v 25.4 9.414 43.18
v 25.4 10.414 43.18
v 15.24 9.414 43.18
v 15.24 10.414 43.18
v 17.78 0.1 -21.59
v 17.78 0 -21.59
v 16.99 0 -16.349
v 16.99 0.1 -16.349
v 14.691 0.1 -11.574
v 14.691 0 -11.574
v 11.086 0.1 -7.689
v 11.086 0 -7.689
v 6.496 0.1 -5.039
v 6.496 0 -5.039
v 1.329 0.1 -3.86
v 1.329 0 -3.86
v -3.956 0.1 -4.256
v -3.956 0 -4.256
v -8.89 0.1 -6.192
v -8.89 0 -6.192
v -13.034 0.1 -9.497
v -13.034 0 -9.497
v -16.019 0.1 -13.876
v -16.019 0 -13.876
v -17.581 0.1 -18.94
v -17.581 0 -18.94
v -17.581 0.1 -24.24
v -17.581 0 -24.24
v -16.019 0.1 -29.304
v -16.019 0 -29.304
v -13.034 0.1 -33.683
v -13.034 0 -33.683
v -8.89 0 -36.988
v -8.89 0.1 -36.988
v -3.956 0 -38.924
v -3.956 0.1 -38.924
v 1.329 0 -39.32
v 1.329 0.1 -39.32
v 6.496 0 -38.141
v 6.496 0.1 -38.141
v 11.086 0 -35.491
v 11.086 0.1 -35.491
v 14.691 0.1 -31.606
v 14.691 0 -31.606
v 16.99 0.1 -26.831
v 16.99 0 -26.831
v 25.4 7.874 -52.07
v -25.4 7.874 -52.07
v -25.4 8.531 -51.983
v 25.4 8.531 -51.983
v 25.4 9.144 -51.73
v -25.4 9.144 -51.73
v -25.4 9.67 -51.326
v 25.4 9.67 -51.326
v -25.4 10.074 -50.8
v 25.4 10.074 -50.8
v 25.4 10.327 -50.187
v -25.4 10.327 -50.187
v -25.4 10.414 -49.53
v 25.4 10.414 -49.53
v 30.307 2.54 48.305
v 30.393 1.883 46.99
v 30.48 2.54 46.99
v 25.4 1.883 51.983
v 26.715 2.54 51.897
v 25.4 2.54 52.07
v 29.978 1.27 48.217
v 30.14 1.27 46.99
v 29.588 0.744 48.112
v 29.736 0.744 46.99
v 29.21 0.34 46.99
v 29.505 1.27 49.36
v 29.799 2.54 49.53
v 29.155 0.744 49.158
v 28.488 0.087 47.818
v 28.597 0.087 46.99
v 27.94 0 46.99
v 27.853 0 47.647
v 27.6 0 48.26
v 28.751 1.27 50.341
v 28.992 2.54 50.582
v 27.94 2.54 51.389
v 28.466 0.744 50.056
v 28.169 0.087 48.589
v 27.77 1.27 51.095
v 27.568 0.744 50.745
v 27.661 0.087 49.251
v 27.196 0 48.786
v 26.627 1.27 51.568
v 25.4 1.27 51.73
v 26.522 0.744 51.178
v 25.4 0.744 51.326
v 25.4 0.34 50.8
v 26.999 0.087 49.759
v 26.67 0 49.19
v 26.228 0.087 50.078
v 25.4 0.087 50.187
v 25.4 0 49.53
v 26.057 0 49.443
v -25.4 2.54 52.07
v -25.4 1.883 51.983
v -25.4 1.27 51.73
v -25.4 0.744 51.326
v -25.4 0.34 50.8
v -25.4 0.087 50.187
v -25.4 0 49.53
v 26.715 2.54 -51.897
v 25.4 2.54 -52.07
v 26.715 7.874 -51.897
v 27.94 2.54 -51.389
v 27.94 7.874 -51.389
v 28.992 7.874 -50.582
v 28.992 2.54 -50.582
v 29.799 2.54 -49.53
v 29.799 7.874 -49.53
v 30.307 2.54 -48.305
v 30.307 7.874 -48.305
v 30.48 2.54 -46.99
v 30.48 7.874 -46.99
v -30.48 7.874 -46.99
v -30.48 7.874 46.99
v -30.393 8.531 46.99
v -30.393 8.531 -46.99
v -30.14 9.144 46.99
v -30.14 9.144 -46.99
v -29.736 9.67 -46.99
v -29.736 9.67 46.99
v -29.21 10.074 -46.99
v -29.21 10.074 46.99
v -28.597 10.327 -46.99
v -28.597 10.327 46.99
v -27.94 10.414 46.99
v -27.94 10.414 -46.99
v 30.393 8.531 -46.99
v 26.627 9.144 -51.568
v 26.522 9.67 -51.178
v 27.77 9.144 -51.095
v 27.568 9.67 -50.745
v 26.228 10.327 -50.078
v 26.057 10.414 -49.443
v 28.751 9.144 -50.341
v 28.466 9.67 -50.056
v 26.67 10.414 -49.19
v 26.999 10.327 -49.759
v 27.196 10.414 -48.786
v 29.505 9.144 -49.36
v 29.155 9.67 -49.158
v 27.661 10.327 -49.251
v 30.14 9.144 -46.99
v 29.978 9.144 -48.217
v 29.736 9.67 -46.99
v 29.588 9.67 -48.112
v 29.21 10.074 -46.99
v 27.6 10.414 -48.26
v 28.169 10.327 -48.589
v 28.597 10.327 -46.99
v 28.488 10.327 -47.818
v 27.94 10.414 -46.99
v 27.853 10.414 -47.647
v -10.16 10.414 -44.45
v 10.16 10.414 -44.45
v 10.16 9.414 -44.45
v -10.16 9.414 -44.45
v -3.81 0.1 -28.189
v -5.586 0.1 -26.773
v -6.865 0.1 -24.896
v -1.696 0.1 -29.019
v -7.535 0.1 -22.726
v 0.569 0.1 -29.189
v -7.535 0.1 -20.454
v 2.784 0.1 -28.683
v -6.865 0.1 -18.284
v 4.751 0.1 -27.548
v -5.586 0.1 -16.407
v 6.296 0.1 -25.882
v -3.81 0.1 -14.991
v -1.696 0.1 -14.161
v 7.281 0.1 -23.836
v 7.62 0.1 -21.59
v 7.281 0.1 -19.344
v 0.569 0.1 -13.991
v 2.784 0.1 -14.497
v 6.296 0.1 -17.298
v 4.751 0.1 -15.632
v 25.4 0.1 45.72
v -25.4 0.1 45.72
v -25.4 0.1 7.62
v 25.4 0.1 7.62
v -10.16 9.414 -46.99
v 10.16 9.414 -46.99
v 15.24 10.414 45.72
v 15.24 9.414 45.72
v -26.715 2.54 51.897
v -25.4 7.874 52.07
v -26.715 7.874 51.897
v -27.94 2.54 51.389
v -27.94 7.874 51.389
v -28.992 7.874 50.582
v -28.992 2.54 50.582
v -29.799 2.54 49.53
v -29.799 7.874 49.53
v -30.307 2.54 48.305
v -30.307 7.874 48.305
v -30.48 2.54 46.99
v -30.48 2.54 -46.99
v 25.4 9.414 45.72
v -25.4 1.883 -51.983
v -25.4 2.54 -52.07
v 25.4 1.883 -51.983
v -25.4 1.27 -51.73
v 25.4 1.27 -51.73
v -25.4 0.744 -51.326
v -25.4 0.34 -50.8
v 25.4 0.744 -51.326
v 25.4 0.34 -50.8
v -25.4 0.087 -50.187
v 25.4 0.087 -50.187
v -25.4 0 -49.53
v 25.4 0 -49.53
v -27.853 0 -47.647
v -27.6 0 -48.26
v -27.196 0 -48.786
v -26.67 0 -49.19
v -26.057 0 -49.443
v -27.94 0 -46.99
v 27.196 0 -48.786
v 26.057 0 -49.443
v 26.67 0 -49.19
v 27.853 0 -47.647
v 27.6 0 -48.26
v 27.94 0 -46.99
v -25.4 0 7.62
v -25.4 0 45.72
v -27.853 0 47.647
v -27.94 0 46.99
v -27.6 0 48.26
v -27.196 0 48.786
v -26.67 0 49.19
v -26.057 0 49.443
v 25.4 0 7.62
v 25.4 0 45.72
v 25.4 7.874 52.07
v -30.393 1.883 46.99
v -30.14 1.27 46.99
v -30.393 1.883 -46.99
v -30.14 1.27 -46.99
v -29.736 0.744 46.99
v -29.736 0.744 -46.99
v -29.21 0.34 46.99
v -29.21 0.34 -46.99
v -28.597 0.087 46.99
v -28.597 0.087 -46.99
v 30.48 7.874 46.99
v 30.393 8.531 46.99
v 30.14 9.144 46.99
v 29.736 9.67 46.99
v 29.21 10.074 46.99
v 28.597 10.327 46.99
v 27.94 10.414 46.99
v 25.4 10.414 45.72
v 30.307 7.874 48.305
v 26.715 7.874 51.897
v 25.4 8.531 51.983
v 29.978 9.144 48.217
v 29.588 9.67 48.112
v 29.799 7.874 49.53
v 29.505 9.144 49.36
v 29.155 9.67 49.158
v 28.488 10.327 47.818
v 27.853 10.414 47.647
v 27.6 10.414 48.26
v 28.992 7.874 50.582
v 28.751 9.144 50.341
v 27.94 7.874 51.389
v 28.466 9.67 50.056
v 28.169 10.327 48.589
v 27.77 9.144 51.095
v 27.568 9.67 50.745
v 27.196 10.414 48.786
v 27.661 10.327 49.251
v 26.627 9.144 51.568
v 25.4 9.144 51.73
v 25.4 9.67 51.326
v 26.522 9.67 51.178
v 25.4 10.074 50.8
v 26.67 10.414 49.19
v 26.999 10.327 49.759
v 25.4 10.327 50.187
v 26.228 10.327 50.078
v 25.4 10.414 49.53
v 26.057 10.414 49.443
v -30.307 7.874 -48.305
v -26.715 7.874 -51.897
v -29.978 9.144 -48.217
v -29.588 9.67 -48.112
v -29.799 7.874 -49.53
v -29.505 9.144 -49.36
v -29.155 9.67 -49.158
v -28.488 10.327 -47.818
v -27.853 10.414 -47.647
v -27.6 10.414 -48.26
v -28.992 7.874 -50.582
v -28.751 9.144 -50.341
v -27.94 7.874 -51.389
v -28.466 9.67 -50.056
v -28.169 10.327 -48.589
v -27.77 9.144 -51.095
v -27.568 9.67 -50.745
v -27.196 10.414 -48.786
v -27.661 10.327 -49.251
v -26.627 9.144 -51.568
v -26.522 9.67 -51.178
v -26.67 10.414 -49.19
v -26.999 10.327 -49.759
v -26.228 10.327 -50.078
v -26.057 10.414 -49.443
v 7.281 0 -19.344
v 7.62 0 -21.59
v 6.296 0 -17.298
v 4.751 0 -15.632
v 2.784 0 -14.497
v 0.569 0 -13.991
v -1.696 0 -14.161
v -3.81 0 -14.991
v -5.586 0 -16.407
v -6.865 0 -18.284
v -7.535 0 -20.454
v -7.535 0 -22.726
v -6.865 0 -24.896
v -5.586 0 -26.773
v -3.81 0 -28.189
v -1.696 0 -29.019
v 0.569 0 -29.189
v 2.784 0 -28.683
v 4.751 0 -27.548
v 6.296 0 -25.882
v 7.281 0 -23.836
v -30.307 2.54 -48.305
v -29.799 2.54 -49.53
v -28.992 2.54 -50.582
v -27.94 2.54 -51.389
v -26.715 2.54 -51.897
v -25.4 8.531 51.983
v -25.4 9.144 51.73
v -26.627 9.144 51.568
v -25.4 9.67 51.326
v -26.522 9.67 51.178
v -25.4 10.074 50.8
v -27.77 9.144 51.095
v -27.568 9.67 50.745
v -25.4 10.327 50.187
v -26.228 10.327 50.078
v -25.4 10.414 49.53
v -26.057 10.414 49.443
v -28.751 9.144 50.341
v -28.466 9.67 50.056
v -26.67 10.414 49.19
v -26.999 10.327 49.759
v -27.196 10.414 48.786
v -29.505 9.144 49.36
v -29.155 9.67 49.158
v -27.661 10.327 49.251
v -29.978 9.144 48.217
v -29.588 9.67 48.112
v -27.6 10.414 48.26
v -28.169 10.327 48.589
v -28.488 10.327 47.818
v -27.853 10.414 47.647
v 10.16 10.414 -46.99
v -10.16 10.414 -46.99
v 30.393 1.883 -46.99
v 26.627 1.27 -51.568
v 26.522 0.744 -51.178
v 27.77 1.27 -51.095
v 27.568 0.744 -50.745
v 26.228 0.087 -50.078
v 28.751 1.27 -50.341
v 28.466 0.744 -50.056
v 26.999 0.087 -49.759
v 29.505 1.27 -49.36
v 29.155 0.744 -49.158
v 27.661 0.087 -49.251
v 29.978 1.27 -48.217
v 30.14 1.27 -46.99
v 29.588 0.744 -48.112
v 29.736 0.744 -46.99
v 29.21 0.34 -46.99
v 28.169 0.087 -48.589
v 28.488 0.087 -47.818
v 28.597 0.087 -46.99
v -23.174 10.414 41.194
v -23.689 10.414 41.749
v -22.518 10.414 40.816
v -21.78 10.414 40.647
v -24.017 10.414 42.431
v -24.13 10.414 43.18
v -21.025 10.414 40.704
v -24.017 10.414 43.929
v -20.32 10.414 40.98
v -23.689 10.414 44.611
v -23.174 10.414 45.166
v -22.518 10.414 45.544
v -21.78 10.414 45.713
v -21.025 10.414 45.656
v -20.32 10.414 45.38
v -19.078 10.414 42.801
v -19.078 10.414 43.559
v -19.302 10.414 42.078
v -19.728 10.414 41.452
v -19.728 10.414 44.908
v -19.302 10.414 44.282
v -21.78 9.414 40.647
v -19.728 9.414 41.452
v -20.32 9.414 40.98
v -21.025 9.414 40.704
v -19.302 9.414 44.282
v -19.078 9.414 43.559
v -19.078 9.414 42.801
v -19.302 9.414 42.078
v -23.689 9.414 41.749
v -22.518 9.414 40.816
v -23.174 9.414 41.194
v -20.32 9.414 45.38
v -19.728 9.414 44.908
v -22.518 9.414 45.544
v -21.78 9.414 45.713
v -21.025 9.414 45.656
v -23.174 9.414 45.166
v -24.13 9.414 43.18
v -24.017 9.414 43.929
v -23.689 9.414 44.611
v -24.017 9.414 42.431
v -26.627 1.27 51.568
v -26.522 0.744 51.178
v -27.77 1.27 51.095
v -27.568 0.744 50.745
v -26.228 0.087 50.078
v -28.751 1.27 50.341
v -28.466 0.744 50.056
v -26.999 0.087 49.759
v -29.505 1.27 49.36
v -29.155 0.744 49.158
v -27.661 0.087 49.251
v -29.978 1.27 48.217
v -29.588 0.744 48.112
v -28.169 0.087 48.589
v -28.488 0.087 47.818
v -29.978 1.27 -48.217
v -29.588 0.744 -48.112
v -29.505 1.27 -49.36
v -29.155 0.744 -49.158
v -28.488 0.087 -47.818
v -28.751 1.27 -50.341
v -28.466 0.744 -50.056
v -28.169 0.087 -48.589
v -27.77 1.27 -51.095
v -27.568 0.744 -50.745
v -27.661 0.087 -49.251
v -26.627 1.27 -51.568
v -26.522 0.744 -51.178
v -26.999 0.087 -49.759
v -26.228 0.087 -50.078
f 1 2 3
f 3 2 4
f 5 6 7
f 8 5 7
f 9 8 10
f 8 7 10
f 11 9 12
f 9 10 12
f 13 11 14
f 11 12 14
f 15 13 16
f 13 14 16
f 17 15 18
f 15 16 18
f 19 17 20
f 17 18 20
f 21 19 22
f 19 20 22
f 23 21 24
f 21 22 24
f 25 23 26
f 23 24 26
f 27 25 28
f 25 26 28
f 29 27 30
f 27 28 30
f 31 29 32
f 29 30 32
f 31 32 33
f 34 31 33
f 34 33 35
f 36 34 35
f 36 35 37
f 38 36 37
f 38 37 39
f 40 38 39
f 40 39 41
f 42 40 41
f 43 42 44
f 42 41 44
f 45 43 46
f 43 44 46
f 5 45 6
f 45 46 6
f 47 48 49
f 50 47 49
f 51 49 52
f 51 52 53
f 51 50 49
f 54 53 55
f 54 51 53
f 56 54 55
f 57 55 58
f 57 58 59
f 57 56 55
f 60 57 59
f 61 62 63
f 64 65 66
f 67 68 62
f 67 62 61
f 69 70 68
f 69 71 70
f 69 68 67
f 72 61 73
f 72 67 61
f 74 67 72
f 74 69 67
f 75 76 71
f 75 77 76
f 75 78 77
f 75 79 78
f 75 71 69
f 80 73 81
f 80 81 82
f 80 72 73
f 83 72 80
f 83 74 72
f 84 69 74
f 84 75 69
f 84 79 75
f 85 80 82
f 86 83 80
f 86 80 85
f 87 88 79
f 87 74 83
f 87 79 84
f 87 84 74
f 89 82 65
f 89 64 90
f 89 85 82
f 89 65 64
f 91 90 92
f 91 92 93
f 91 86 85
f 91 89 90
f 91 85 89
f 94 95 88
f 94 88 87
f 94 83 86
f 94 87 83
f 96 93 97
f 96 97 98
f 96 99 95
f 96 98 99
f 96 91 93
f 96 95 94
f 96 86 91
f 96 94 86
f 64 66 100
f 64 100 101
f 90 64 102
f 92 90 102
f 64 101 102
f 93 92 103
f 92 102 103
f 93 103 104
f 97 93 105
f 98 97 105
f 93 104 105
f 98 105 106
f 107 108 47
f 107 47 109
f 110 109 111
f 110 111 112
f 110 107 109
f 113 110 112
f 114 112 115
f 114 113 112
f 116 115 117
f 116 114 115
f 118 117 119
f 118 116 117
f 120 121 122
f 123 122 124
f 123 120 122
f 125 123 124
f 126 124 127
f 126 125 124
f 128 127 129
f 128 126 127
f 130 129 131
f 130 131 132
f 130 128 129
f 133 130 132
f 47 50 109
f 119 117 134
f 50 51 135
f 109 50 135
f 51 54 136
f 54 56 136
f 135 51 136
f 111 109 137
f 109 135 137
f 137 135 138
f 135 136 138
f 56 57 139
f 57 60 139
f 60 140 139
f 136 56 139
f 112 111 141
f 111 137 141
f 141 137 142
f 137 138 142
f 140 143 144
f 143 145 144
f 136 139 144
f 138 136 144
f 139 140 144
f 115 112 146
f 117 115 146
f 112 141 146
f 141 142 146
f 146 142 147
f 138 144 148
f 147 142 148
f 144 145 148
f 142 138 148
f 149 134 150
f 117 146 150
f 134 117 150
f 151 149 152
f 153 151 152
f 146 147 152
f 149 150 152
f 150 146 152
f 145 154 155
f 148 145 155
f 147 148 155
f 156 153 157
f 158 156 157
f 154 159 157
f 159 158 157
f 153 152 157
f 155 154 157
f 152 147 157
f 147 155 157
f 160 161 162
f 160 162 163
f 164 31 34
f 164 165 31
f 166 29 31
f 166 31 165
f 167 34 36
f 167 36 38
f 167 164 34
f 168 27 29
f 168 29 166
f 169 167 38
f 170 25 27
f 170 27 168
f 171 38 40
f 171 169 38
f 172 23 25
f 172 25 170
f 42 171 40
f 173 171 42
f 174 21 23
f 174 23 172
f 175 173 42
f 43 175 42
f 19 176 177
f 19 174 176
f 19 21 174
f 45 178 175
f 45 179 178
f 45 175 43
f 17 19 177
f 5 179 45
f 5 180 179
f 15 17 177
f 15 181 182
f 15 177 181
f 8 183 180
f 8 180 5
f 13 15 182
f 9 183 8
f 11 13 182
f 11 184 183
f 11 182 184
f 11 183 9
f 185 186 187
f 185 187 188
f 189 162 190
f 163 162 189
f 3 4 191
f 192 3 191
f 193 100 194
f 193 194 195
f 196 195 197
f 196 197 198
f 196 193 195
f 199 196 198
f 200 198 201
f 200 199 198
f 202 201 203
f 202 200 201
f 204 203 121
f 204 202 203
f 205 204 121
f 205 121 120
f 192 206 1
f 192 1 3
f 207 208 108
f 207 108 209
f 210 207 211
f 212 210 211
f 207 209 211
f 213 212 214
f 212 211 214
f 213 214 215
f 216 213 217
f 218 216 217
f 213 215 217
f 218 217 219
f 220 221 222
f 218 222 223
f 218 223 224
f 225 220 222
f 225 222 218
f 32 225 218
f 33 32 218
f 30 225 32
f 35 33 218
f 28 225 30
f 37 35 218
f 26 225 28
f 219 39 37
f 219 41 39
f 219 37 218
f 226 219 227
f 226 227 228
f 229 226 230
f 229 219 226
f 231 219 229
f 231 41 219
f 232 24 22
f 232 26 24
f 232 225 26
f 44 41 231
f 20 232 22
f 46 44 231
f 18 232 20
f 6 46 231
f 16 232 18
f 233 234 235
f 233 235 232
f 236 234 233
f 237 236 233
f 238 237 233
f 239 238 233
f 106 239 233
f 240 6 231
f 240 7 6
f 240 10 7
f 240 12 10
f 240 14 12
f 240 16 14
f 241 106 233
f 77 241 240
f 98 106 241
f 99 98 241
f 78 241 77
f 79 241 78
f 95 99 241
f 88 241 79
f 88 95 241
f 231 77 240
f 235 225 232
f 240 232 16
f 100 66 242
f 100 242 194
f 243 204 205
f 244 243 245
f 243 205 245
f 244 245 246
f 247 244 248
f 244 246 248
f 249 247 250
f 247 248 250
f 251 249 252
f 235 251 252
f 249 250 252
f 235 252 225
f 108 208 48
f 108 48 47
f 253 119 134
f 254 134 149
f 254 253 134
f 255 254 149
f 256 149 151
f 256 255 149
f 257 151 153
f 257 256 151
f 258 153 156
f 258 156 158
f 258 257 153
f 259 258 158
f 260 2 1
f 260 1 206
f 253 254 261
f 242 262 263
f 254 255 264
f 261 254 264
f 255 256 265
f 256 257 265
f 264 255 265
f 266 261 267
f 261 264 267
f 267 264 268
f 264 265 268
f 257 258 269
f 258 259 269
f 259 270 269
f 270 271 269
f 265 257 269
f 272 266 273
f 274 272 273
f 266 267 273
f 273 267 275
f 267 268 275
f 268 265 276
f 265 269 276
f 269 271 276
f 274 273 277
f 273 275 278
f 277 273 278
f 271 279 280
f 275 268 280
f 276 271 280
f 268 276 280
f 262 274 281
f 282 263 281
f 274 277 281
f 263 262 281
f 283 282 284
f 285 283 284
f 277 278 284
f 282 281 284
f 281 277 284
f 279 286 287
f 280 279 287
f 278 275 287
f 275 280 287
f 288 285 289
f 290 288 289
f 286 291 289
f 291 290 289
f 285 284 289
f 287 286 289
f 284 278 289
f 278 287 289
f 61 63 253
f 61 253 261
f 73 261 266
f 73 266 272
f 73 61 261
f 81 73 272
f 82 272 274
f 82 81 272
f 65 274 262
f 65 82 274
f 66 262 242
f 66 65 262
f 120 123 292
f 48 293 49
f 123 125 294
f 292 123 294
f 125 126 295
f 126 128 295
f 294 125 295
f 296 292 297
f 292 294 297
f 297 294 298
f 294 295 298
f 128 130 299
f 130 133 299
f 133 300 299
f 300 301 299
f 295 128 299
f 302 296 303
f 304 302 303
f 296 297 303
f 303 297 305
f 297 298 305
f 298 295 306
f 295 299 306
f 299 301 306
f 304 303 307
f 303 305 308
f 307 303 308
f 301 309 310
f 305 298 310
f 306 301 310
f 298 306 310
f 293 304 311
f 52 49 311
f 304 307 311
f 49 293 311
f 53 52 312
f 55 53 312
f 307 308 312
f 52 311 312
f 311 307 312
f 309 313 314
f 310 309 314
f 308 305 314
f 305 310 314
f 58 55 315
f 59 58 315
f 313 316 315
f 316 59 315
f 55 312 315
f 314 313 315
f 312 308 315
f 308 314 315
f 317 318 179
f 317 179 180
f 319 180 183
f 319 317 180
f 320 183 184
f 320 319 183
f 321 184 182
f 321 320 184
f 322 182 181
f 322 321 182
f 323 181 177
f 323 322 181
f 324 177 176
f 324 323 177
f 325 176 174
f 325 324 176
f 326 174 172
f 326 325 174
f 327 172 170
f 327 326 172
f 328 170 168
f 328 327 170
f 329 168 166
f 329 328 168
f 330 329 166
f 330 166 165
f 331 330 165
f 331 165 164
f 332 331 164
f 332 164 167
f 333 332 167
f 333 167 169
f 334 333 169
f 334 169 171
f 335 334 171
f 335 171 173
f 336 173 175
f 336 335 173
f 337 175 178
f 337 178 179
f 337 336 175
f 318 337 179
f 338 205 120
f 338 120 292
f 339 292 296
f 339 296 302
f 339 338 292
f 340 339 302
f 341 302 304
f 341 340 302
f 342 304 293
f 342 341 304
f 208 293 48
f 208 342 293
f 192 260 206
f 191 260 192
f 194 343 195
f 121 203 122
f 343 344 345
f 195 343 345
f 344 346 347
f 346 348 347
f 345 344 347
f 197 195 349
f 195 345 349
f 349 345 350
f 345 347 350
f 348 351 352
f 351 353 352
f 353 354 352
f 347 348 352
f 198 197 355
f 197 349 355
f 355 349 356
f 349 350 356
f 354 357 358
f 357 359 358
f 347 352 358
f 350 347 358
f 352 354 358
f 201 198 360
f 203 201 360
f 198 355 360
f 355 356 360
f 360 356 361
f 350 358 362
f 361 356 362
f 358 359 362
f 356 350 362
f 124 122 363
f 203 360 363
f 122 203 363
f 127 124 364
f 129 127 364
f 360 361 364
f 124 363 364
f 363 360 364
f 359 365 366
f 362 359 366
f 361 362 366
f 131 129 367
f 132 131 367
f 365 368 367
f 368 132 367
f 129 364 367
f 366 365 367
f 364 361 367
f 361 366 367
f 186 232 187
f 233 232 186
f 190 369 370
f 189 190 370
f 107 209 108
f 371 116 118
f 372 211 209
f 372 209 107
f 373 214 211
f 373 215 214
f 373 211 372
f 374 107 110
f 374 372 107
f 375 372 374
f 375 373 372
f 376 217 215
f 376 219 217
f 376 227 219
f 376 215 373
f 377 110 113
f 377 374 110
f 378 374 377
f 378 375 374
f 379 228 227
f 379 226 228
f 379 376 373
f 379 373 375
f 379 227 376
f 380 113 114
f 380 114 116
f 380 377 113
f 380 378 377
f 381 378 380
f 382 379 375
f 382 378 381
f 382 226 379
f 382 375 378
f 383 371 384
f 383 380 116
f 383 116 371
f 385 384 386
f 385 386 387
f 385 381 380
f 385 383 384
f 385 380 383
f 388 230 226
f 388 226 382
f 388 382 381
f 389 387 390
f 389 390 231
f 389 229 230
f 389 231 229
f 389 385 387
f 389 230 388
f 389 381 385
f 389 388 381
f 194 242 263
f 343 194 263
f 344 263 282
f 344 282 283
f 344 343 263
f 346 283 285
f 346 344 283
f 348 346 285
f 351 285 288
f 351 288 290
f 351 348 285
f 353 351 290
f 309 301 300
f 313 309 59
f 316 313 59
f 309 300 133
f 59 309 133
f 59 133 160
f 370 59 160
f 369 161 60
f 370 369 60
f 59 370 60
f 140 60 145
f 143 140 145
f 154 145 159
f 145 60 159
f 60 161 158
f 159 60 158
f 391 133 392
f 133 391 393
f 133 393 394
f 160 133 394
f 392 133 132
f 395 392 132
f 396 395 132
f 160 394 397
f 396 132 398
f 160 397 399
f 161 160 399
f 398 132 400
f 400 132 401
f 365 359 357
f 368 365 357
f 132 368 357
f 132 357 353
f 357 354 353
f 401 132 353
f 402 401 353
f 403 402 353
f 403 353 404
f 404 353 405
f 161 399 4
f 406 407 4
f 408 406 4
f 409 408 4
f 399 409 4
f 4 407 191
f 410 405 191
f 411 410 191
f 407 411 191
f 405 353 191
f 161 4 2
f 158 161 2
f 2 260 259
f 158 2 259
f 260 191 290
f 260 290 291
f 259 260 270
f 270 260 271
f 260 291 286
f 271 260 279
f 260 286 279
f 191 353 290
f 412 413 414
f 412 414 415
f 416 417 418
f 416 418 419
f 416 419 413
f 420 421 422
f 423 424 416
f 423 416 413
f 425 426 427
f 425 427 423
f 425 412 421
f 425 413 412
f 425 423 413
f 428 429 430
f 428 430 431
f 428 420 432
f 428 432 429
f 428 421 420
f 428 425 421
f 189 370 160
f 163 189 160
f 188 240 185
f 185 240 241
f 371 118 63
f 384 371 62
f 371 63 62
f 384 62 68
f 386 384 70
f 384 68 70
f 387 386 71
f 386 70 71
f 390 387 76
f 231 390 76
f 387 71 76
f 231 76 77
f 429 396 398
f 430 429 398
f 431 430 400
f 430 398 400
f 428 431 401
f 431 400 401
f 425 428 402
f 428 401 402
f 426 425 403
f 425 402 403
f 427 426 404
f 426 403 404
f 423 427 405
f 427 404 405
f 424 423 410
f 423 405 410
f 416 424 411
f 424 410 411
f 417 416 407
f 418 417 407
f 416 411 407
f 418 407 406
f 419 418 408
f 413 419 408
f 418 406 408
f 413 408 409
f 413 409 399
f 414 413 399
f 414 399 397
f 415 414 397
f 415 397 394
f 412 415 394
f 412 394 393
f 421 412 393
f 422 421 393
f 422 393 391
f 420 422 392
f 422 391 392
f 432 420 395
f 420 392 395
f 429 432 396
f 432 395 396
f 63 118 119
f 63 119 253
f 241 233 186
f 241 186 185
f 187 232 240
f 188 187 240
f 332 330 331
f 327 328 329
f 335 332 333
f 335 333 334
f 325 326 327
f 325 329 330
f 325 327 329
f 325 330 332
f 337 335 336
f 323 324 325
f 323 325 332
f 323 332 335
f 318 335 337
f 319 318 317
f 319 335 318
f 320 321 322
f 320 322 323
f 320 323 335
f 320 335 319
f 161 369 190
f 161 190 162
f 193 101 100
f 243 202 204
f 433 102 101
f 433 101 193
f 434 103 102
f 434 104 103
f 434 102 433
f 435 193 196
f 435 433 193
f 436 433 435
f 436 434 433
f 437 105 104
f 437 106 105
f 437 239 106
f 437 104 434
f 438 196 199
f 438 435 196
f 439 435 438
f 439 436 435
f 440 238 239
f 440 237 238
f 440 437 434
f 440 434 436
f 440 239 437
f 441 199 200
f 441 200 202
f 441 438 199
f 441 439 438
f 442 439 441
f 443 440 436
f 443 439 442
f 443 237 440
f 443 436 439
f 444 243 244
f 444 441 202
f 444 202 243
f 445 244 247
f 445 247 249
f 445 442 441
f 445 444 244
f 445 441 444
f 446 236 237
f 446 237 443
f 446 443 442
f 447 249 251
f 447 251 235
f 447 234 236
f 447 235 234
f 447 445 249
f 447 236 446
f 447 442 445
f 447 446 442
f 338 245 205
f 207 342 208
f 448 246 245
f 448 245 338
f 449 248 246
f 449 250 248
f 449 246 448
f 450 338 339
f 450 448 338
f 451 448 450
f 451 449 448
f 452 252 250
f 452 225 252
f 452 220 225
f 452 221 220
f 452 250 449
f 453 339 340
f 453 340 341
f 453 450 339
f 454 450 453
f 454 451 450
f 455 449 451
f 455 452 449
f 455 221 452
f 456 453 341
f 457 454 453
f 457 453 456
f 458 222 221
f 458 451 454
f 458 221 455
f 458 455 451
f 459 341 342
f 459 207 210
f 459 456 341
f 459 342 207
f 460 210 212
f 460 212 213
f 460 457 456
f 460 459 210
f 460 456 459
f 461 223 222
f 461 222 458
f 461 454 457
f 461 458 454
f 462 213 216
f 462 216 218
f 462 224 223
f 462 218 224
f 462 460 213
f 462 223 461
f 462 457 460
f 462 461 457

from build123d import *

# Parameters (mm, degrees)
F0_R     = 17.78
F0_W     = 50.8
F0_H     = 38.1
F0_R_2   = 7.62
F1_DEPTH = 10.414
F2_DEPTH = 0.1
F3_W     = 10.16
F3_H     = 2.54
F3_R     = 2.54
F3_W_2   = 20.32
F4_DEPTH = 1
F5_R     = 2.54


with BuildPart() as f1:
    # F0 (on Front) → F1 (new body)
    with BuildSketch(Plane.XZ):
        with BuildLine():
            ThreePointArc((30.48, 46.99), (28.9921024484, 50.5821024484), (25.4, 52.07))
            Line((25.4, 52.07), (-25.4, 52.07))
            ThreePointArc((-25.4, 52.07), (-28.9921024484, 50.5821024484), (-30.48, 46.99))
            Line((-30.48, 46.99), (-30.48, -46.99))
            ThreePointArc((-30.48, -46.99), (-28.9921024484, -50.5821024484), (-25.4, -52.07))
            Line((-25.4, -52.07), (25.4, -52.07))
            ThreePointArc((25.4, -52.07), (28.9921024484, -50.5821024484), (30.48, -46.99))
            Line((30.48, -46.99), (30.48, 46.99))
        make_face()
        with Locations((0, -21.59)):
            Circle(F0_R, mode=Mode.SUBTRACT)
        with Locations((0, 26.67)):
            Rectangle(F0_W, F0_H, mode=Mode.SUBTRACT)
        with Locations((0, 26.67)):
            Rectangle(F0_W, F0_H)
        with Locations((0, -21.59)):
            Circle(F0_R)
        with Locations((0, -21.59)):
            Circle(F0_R_2, mode=Mode.SUBTRACT)
        with Locations((0, -21.59)):
            Circle(F0_R_2)
    extrude(amount=-F1_DEPTH)

    # F0 (on Front) → F2 (cut)
    with BuildSketch(Plane.XZ):
        with Locations((0, 26.67)):
            Rectangle(F0_W, F0_H)
        with Locations((0, -21.59)):
            Circle(F0_R)
        with Locations((0, -21.59)):
            Circle(F0_R_2, mode=Mode.SUBTRACT)
    extrude(amount=-F2_DEPTH, mode=Mode.SUBTRACT)

    # F3 (on face) → F4 (cut)
    with BuildSketch(Plane(origin=(0, 10.414, 0), x_dir=(-1, 0, 0), z_dir=(0, 1, 0))):
        with Locations((-20.32, 44.45)):
            Rectangle(F3_W, F3_H)
        with Locations((21.59, 43.18)):
            Circle(F3_R)
        with Locations((0, -45.72)):
            Rectangle(F3_W_2, F3_H)
    extrude(amount=-F4_DEPTH, mode=Mode.SUBTRACT)

    # F5
    f5_edges = [f1.edges().sort_by_distance(p)[0] for p in [
        (30.48, 0, 0),
        (30.48, 10.414, 0),
    ]]
    fillet(f5_edges, radius=F5_R)


solid = f1.part
